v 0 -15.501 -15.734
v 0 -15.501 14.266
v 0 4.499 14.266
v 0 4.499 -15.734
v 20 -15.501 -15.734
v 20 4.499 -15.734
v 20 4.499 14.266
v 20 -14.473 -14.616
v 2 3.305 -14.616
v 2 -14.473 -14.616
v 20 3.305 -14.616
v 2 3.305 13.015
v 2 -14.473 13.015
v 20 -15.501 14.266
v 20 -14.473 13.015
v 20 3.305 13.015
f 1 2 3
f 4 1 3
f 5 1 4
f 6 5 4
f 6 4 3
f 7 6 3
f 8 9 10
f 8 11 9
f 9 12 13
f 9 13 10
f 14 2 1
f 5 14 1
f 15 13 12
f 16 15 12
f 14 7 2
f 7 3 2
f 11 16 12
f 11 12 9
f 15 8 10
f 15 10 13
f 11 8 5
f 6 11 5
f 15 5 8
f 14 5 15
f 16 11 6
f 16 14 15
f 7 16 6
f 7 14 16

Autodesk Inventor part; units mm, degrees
ref_plane "YZ Plane" through (0, 0, 0) normal (1, 0, 0) x (0, 1, 0)
ref_plane "XZ Plane" through (0, 0, 0) normal (0, 1, 0) x (-1, 0, 0)
ref_plane "XY Plane" through (0, 0, 0) normal (0, 0, 1) x (1, 0, 0)
sketch "Sketch1" plane through (0, 0, 0) normal (1, 0, 0) x (0, 1, 0)
  line L0 (4.4986, 14.2657) -> (-15.5014, 14.2657)
  line L1 (-15.5014, 14.2657) -> (-15.5014, -15.7343)
  line L2 (-15.5014, -15.7343) -> (4.4986, -15.7343)
  line L3 (4.4986, -15.7343) -> (4.4986, 14.2657)
  point P0 (0, 0)
  dimension "d0" = 20
  dimension "d1" = 30
extrude "Extrusion1" add sketch "Sketch1" along normal blind 20
sketch "Sketch2" plane through (20, 0, 0) normal (1, 0, 0) x (0, 0, -1)
  line L0 (-13.0153, 3.3051) -> (14.6165, 3.3051)
  line L1 (14.6165, 3.3051) -> (14.6165, -14.4728)
  line L2 (14.6165, -14.4728) -> (-13.0153, -14.4728)
  line L3 (-13.0153, -14.4728) -> (-13.0153, 3.3051)
  point P0 (0, 0)
extrude "Extrusion2" cut sketch "Sketch2" against normal blind 18
